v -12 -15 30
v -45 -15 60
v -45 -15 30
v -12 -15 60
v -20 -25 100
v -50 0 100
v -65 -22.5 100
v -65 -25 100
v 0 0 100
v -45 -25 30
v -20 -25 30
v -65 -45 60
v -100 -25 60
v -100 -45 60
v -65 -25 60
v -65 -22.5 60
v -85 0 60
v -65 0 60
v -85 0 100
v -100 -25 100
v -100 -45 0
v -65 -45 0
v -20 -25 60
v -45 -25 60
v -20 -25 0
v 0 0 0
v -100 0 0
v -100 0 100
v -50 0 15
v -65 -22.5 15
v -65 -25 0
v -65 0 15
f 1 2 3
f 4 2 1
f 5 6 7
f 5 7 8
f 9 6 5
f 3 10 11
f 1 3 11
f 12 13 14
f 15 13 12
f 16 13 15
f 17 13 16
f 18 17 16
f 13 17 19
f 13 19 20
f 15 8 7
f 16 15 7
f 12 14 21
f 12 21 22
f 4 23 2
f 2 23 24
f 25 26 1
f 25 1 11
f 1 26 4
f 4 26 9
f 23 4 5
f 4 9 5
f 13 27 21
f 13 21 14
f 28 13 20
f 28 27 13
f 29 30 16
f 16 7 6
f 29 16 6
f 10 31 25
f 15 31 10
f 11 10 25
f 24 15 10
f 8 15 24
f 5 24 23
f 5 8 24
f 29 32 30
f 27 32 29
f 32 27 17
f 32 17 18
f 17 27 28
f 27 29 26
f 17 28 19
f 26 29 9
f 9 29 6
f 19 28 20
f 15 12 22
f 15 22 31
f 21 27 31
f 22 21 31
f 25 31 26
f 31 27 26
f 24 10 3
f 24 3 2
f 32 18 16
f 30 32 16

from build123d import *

# Parameters (mm, degrees)
F0_W      = 100
F0_H      = 100
F1_DEPTH  = 45
F3_DEPTH  = 40
F5_DEPTH  = 85
F6_W      = 45
F6_H      = 20
F7_DEPTH  = 100.001
F9_DEPTH  = 100.001
F10_W     = 25
F10_H     = 30
F10_W_2   = 10
F11_DEPTH = 10


with BuildPart() as f1:
    # F0 (on Front) → F1 (new body)
    with BuildSketch(Plane.XZ):
        with Locations((-50, 50)):
            Rectangle(F0_W, F0_H)
    extrude(amount=F1_DEPTH)

    # F2 (on face) → F3 (cut)
    with BuildSketch(Plane.XY.offset(100)):
        Polygon((-100, -25), (-100, -45), (-65, -45), (-65, 0), (-85, 0), align=None)
    extrude(amount=-F3_DEPTH, mode=Mode.SUBTRACT)

    # F4 (on face) → F5 (cut)
    with BuildSketch(Plane.XY.offset(100)):
        Polygon((-50, 0), (-65, 0), (-65, -22.5), align=None)
    extrude(amount=-F5_DEPTH, mode=Mode.SUBTRACT)

    # F6 (on face) → F7 (cut, through all)
    with BuildSketch(Plane.XY.offset(100)):
        with Locations((-42.5, -35)):
            Rectangle(F6_W, F6_H)
    extrude(amount=-F7_DEPTH, mode=Mode.SUBTRACT)

    # F8 (on face) → F9 (cut, through all)
    with BuildSketch(Plane.XY.offset(100)):
        Polygon((0, 0), (-20, -25), (-20, -45), (0, -45), align=None)
    extrude(amount=-F9_DEPTH, mode=Mode.SUBTRACT)

    # F10 (on face) → F11 (cut)
    with BuildSketch(Plane.XZ.offset(25)):
        with Locations((-32.5, 45)):
            Rectangle(F10_W, F10_H)
        with Locations((-15, 45)):
            Rectangle(F10_W_2, F10_H)
    extrude(amount=-F11_DEPTH, mode=Mode.SUBTRACT)


solid = f1.part
